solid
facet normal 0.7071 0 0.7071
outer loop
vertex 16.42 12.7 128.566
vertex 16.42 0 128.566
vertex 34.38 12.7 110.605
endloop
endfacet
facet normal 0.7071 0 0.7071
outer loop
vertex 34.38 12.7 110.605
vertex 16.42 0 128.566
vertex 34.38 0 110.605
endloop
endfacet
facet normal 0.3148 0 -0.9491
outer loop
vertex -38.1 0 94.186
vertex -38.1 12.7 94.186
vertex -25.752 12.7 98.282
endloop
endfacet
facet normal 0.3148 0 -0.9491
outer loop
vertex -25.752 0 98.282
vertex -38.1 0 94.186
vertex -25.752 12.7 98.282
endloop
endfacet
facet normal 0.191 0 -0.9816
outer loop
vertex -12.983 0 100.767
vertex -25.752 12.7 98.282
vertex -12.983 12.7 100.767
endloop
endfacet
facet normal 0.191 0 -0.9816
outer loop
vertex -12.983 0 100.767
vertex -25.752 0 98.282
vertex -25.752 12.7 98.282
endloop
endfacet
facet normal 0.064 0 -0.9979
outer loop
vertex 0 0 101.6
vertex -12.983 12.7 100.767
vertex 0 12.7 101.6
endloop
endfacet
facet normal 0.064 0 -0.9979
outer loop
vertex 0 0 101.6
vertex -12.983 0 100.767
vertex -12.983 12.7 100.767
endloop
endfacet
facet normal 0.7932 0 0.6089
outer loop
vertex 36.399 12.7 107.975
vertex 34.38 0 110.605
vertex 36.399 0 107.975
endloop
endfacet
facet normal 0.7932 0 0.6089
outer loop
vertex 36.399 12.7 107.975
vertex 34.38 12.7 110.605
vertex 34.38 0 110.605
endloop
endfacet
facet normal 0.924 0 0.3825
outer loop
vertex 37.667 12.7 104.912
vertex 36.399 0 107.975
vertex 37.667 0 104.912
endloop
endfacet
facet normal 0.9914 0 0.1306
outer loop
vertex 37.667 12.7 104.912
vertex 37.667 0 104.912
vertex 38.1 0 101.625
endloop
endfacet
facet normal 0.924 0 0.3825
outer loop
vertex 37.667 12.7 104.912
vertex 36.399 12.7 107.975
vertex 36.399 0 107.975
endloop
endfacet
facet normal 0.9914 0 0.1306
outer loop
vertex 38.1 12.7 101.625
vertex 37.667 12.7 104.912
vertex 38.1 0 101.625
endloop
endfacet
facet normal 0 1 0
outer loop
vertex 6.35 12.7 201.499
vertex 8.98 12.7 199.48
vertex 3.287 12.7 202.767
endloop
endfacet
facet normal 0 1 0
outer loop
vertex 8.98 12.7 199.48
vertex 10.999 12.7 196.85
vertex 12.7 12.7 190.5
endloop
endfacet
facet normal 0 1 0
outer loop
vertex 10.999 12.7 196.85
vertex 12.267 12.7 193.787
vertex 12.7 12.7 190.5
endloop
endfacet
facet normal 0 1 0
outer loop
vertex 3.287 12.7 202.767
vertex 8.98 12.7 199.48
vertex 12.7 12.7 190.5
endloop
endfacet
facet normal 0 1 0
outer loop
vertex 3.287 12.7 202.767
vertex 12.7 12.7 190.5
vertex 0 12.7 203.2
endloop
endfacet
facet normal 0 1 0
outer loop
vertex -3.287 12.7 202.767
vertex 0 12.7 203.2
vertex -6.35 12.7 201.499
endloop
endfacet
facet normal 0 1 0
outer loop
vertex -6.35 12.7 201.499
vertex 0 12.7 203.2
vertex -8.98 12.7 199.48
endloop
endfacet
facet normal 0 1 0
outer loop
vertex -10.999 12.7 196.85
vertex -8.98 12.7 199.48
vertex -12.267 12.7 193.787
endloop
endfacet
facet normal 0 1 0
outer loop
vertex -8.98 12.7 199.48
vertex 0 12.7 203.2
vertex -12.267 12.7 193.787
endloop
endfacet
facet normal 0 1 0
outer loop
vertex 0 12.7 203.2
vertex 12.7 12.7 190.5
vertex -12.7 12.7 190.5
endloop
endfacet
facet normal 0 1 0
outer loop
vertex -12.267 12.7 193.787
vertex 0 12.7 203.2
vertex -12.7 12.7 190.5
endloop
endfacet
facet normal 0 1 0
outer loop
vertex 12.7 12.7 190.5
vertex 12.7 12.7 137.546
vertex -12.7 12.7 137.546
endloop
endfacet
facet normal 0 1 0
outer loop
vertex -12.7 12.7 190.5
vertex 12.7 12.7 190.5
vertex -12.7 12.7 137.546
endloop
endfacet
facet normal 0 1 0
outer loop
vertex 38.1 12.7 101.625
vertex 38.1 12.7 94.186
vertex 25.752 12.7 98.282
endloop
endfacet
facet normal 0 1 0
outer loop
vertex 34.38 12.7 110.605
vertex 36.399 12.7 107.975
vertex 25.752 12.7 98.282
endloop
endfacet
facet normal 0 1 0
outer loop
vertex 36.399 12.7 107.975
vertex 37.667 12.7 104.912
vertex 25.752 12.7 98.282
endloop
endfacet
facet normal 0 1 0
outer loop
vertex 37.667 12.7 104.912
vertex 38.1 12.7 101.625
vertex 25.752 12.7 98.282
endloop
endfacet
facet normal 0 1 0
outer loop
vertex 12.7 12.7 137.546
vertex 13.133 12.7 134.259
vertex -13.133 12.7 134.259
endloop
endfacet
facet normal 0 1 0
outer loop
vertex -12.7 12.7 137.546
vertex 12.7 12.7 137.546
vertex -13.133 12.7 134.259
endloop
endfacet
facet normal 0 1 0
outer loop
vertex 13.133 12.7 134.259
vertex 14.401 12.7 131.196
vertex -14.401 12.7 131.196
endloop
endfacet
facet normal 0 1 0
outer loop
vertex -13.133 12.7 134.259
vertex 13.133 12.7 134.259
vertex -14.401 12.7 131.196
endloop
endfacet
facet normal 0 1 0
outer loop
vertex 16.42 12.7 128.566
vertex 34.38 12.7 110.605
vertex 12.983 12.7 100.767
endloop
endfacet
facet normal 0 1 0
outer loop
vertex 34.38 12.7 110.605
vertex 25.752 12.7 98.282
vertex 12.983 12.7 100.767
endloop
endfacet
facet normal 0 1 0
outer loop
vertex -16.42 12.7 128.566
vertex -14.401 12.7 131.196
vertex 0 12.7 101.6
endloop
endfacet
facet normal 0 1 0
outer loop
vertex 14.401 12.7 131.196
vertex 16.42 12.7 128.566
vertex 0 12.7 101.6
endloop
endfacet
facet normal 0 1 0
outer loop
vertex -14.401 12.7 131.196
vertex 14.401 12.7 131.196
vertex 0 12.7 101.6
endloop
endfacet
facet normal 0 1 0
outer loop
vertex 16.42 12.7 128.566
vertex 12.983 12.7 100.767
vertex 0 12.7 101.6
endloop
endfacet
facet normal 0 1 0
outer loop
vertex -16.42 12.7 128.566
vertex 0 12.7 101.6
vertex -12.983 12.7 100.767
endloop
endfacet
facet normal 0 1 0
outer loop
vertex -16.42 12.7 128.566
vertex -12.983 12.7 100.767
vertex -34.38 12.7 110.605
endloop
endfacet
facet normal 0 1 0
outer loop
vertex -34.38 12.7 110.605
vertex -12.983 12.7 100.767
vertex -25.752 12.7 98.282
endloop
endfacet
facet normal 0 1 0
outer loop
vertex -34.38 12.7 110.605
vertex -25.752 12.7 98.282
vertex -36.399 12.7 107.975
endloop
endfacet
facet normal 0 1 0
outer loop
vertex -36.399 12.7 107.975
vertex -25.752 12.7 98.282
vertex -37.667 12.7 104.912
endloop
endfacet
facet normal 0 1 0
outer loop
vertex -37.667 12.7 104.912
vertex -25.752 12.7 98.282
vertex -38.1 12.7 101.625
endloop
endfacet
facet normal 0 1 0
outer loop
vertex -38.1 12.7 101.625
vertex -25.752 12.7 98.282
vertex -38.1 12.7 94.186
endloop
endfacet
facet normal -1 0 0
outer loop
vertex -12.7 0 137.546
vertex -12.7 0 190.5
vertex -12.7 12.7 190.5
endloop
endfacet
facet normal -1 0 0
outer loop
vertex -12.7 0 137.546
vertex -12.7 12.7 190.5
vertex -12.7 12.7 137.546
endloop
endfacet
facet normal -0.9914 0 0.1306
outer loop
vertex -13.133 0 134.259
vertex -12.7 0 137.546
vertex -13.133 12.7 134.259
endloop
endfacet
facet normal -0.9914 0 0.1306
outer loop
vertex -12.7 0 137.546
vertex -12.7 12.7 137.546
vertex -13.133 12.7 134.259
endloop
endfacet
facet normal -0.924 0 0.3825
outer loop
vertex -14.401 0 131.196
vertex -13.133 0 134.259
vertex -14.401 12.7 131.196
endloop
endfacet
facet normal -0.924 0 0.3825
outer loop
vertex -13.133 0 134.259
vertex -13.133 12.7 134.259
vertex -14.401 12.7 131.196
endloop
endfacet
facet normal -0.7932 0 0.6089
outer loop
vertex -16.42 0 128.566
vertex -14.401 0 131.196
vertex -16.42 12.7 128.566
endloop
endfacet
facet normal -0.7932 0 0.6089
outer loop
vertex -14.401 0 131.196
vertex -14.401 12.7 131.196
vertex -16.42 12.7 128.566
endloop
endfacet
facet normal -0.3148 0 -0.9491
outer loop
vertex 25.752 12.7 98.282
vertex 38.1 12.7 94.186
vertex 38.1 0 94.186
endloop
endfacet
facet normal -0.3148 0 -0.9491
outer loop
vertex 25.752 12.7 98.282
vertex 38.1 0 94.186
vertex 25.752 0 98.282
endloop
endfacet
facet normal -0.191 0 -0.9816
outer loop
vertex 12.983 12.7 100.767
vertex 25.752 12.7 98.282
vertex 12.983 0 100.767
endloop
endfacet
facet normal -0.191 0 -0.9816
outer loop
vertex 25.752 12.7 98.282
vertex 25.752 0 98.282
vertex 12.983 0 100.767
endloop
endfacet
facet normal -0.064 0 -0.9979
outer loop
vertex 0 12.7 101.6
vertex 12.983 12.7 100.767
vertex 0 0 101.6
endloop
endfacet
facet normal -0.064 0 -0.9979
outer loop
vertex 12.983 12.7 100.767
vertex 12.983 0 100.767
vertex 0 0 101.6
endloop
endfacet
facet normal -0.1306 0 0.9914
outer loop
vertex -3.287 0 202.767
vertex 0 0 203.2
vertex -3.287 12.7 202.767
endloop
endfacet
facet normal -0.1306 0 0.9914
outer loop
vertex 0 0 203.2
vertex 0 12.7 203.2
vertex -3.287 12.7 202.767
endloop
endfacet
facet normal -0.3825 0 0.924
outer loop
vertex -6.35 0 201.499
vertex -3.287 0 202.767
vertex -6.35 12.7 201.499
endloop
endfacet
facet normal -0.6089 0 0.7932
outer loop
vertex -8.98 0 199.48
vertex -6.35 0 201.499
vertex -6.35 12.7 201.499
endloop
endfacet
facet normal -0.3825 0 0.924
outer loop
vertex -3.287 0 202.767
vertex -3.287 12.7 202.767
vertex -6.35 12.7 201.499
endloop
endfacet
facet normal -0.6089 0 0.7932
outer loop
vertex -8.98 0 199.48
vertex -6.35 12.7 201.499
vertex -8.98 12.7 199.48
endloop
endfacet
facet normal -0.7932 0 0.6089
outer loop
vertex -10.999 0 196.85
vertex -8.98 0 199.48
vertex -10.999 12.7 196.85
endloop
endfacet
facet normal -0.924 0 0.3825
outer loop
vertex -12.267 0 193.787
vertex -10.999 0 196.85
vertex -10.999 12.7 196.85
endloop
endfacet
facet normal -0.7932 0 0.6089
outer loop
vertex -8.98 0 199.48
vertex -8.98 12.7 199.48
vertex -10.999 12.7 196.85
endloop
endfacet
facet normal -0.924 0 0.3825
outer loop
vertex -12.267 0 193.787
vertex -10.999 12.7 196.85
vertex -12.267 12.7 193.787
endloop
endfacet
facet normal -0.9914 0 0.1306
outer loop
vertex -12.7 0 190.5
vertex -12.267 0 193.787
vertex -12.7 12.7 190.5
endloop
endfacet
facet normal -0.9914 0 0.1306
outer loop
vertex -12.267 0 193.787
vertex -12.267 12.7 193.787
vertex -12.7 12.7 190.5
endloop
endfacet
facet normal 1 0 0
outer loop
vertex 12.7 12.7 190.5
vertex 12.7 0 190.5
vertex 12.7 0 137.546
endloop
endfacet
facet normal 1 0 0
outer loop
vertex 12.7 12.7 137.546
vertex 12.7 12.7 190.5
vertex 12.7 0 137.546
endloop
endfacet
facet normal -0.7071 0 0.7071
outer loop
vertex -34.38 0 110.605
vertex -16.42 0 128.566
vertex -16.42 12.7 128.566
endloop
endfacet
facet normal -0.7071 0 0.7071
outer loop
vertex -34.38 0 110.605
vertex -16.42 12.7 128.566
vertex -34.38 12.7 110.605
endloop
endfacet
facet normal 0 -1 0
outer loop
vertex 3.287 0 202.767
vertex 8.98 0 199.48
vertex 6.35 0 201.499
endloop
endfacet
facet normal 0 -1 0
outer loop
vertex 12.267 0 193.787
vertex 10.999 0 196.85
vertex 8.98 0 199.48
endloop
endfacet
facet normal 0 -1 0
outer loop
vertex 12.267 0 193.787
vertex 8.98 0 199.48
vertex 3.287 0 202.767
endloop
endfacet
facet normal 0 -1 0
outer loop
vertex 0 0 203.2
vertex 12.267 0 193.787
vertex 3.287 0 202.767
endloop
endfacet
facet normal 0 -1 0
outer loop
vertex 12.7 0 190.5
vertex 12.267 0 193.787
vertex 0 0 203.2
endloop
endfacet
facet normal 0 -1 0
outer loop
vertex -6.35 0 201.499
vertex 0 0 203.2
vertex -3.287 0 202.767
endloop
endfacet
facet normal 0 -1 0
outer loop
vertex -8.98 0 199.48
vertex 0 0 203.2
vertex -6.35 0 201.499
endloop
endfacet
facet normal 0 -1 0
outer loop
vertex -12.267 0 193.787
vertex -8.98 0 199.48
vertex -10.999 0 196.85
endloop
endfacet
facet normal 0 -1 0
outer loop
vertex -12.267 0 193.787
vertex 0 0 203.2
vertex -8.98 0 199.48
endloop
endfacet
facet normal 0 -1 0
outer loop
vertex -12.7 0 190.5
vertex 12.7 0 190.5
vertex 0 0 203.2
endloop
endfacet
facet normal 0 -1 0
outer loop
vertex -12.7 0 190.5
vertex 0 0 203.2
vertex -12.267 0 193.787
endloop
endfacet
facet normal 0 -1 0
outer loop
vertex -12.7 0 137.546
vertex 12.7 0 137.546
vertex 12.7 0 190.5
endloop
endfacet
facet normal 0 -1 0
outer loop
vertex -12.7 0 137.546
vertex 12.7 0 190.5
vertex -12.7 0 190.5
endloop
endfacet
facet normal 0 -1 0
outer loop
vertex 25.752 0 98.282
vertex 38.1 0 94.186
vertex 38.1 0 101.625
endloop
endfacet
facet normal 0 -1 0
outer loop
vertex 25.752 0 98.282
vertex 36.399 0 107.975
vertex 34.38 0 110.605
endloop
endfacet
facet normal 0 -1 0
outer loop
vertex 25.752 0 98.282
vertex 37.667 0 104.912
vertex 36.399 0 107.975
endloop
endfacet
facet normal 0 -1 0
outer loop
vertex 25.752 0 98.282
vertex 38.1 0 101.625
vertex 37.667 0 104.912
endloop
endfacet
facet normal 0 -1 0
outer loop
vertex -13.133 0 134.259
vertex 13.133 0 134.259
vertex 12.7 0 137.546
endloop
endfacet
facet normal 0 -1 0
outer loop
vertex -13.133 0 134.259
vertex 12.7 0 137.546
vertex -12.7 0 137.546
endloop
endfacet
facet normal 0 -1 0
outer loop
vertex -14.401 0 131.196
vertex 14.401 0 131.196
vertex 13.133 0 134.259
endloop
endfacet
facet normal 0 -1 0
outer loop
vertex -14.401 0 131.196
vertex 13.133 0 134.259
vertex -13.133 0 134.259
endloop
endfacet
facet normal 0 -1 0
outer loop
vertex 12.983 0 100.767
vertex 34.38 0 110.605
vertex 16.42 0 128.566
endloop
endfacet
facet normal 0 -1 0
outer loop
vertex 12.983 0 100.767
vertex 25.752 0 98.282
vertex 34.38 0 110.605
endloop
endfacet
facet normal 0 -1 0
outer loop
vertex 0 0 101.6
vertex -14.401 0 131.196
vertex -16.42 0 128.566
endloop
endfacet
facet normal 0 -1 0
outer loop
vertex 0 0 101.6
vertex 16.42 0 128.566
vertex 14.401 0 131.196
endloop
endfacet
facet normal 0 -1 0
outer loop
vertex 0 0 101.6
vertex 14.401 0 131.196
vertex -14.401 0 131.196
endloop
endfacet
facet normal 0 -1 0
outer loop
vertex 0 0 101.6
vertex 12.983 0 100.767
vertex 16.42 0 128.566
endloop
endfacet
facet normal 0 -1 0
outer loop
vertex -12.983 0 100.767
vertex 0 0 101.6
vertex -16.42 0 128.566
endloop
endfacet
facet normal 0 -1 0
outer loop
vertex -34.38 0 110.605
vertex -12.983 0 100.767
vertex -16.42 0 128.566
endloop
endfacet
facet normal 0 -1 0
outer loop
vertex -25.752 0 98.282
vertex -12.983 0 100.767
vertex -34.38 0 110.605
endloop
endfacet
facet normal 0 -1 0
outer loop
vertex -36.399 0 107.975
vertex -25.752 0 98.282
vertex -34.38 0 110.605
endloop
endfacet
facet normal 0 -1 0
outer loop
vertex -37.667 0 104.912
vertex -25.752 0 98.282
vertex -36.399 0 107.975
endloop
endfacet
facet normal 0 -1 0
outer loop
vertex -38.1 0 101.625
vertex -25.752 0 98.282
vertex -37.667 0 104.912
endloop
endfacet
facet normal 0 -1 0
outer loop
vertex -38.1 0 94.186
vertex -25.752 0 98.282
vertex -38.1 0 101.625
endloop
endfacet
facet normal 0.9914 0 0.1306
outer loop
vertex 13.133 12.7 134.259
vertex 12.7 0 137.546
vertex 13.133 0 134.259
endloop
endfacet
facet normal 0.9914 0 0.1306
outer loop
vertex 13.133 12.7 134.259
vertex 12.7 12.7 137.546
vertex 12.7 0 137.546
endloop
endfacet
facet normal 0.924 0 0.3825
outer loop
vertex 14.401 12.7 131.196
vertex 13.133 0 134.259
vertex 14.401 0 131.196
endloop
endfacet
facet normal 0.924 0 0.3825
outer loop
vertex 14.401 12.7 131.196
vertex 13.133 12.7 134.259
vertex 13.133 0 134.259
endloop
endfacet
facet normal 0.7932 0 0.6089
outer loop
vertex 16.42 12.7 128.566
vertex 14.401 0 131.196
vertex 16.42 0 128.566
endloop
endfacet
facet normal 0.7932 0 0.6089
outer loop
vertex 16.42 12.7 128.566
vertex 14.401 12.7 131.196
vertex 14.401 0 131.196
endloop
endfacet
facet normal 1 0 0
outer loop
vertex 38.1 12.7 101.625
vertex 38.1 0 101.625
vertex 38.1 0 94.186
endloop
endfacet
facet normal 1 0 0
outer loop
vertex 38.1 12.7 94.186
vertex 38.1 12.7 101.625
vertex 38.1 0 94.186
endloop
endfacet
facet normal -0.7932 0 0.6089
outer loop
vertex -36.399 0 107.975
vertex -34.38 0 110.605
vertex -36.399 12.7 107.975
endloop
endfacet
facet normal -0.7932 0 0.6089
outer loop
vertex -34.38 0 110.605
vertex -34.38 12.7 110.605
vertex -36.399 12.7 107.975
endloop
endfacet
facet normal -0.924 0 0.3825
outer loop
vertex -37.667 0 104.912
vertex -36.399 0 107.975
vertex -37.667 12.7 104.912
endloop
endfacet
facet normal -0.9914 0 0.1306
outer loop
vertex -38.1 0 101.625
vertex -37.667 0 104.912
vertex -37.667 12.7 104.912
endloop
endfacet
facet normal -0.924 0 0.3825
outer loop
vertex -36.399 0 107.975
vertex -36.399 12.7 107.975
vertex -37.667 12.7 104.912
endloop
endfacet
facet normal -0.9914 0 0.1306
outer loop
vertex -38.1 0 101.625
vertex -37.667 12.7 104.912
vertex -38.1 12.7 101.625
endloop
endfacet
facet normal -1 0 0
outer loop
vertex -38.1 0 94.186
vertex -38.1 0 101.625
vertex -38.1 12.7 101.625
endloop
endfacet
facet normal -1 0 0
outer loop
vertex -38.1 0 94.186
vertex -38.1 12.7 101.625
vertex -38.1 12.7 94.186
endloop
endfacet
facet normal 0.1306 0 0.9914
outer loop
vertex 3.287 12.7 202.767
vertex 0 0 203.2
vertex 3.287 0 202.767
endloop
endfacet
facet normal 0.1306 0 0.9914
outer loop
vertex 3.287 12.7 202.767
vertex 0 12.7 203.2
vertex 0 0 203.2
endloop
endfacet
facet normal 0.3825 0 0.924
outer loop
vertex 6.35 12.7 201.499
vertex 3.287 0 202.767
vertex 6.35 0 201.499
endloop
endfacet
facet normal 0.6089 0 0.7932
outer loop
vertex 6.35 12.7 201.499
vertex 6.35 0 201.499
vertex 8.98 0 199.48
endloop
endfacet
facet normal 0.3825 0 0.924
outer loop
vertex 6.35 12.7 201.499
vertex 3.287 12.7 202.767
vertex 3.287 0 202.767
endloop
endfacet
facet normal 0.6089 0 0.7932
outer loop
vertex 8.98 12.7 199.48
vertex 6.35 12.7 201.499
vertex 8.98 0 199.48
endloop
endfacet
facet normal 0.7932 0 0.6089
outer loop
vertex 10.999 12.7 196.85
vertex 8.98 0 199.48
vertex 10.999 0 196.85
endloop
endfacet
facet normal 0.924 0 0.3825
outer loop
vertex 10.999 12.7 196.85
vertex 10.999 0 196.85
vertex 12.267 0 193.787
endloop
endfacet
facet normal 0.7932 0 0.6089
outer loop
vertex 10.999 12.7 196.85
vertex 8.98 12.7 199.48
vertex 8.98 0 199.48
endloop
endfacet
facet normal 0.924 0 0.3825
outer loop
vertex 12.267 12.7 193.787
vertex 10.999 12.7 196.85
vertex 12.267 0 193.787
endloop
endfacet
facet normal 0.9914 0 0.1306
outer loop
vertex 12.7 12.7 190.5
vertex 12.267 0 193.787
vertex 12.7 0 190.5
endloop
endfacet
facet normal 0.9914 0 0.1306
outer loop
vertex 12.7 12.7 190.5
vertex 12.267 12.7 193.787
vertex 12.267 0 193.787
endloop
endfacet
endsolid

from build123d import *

# Parameters (mm, degrees)
BOSS_EXTRUDE1_DEPTH = 12.7
FILLET1_R           = 12.7


with BuildPart() as part:
    # Sketch1 → Boss-Extrude1 (new body)
    with BuildSketch(Plane(origin=(0, 0, 0), x_dir=(1, 0, 0), z_dir=(0, 1, 0))):
        with BuildLine():
            Line((0, -101.6), (0, -203.2))
            Line((0, -203.2), (12.7, -203.2))
            Line((12.7, -203.2), (12.7, -132.285720786))
            Line((12.7, -132.285720786), (38.1, -106.885720786))
            Line((38.1, -106.885720786), (38.1, -94.185720786))
            ThreePointArc((38.1, -94.185720786), (19.407353866, -99.729206434), (0, -101.6))
        make_face()
    extrude(amount=BOSS_EXTRUDE1_DEPTH)

    # Fillet1
    fillet1_edges = [part.edges().sort_by_distance(p)[0] for p in [
        (38.1, 6.35, 106.885720786),
        (12.7, 6.35, 132.285720786),
        (12.7, 6.35, 203.2),
    ]]
    fillet(fillet1_edges, radius=FILLET1_R - 0.0001)  # a hair under: the kernel refuses the full size

    # Mirror1: part across plane


with BuildPart() as part_1:
    add(part.part)
    add(part.part.mirror(Plane(origin=(0, 12.7, 101.6), x_dir=(0, 0, 1), z_dir=(1, 0, 0))))


solid = part_1.part
